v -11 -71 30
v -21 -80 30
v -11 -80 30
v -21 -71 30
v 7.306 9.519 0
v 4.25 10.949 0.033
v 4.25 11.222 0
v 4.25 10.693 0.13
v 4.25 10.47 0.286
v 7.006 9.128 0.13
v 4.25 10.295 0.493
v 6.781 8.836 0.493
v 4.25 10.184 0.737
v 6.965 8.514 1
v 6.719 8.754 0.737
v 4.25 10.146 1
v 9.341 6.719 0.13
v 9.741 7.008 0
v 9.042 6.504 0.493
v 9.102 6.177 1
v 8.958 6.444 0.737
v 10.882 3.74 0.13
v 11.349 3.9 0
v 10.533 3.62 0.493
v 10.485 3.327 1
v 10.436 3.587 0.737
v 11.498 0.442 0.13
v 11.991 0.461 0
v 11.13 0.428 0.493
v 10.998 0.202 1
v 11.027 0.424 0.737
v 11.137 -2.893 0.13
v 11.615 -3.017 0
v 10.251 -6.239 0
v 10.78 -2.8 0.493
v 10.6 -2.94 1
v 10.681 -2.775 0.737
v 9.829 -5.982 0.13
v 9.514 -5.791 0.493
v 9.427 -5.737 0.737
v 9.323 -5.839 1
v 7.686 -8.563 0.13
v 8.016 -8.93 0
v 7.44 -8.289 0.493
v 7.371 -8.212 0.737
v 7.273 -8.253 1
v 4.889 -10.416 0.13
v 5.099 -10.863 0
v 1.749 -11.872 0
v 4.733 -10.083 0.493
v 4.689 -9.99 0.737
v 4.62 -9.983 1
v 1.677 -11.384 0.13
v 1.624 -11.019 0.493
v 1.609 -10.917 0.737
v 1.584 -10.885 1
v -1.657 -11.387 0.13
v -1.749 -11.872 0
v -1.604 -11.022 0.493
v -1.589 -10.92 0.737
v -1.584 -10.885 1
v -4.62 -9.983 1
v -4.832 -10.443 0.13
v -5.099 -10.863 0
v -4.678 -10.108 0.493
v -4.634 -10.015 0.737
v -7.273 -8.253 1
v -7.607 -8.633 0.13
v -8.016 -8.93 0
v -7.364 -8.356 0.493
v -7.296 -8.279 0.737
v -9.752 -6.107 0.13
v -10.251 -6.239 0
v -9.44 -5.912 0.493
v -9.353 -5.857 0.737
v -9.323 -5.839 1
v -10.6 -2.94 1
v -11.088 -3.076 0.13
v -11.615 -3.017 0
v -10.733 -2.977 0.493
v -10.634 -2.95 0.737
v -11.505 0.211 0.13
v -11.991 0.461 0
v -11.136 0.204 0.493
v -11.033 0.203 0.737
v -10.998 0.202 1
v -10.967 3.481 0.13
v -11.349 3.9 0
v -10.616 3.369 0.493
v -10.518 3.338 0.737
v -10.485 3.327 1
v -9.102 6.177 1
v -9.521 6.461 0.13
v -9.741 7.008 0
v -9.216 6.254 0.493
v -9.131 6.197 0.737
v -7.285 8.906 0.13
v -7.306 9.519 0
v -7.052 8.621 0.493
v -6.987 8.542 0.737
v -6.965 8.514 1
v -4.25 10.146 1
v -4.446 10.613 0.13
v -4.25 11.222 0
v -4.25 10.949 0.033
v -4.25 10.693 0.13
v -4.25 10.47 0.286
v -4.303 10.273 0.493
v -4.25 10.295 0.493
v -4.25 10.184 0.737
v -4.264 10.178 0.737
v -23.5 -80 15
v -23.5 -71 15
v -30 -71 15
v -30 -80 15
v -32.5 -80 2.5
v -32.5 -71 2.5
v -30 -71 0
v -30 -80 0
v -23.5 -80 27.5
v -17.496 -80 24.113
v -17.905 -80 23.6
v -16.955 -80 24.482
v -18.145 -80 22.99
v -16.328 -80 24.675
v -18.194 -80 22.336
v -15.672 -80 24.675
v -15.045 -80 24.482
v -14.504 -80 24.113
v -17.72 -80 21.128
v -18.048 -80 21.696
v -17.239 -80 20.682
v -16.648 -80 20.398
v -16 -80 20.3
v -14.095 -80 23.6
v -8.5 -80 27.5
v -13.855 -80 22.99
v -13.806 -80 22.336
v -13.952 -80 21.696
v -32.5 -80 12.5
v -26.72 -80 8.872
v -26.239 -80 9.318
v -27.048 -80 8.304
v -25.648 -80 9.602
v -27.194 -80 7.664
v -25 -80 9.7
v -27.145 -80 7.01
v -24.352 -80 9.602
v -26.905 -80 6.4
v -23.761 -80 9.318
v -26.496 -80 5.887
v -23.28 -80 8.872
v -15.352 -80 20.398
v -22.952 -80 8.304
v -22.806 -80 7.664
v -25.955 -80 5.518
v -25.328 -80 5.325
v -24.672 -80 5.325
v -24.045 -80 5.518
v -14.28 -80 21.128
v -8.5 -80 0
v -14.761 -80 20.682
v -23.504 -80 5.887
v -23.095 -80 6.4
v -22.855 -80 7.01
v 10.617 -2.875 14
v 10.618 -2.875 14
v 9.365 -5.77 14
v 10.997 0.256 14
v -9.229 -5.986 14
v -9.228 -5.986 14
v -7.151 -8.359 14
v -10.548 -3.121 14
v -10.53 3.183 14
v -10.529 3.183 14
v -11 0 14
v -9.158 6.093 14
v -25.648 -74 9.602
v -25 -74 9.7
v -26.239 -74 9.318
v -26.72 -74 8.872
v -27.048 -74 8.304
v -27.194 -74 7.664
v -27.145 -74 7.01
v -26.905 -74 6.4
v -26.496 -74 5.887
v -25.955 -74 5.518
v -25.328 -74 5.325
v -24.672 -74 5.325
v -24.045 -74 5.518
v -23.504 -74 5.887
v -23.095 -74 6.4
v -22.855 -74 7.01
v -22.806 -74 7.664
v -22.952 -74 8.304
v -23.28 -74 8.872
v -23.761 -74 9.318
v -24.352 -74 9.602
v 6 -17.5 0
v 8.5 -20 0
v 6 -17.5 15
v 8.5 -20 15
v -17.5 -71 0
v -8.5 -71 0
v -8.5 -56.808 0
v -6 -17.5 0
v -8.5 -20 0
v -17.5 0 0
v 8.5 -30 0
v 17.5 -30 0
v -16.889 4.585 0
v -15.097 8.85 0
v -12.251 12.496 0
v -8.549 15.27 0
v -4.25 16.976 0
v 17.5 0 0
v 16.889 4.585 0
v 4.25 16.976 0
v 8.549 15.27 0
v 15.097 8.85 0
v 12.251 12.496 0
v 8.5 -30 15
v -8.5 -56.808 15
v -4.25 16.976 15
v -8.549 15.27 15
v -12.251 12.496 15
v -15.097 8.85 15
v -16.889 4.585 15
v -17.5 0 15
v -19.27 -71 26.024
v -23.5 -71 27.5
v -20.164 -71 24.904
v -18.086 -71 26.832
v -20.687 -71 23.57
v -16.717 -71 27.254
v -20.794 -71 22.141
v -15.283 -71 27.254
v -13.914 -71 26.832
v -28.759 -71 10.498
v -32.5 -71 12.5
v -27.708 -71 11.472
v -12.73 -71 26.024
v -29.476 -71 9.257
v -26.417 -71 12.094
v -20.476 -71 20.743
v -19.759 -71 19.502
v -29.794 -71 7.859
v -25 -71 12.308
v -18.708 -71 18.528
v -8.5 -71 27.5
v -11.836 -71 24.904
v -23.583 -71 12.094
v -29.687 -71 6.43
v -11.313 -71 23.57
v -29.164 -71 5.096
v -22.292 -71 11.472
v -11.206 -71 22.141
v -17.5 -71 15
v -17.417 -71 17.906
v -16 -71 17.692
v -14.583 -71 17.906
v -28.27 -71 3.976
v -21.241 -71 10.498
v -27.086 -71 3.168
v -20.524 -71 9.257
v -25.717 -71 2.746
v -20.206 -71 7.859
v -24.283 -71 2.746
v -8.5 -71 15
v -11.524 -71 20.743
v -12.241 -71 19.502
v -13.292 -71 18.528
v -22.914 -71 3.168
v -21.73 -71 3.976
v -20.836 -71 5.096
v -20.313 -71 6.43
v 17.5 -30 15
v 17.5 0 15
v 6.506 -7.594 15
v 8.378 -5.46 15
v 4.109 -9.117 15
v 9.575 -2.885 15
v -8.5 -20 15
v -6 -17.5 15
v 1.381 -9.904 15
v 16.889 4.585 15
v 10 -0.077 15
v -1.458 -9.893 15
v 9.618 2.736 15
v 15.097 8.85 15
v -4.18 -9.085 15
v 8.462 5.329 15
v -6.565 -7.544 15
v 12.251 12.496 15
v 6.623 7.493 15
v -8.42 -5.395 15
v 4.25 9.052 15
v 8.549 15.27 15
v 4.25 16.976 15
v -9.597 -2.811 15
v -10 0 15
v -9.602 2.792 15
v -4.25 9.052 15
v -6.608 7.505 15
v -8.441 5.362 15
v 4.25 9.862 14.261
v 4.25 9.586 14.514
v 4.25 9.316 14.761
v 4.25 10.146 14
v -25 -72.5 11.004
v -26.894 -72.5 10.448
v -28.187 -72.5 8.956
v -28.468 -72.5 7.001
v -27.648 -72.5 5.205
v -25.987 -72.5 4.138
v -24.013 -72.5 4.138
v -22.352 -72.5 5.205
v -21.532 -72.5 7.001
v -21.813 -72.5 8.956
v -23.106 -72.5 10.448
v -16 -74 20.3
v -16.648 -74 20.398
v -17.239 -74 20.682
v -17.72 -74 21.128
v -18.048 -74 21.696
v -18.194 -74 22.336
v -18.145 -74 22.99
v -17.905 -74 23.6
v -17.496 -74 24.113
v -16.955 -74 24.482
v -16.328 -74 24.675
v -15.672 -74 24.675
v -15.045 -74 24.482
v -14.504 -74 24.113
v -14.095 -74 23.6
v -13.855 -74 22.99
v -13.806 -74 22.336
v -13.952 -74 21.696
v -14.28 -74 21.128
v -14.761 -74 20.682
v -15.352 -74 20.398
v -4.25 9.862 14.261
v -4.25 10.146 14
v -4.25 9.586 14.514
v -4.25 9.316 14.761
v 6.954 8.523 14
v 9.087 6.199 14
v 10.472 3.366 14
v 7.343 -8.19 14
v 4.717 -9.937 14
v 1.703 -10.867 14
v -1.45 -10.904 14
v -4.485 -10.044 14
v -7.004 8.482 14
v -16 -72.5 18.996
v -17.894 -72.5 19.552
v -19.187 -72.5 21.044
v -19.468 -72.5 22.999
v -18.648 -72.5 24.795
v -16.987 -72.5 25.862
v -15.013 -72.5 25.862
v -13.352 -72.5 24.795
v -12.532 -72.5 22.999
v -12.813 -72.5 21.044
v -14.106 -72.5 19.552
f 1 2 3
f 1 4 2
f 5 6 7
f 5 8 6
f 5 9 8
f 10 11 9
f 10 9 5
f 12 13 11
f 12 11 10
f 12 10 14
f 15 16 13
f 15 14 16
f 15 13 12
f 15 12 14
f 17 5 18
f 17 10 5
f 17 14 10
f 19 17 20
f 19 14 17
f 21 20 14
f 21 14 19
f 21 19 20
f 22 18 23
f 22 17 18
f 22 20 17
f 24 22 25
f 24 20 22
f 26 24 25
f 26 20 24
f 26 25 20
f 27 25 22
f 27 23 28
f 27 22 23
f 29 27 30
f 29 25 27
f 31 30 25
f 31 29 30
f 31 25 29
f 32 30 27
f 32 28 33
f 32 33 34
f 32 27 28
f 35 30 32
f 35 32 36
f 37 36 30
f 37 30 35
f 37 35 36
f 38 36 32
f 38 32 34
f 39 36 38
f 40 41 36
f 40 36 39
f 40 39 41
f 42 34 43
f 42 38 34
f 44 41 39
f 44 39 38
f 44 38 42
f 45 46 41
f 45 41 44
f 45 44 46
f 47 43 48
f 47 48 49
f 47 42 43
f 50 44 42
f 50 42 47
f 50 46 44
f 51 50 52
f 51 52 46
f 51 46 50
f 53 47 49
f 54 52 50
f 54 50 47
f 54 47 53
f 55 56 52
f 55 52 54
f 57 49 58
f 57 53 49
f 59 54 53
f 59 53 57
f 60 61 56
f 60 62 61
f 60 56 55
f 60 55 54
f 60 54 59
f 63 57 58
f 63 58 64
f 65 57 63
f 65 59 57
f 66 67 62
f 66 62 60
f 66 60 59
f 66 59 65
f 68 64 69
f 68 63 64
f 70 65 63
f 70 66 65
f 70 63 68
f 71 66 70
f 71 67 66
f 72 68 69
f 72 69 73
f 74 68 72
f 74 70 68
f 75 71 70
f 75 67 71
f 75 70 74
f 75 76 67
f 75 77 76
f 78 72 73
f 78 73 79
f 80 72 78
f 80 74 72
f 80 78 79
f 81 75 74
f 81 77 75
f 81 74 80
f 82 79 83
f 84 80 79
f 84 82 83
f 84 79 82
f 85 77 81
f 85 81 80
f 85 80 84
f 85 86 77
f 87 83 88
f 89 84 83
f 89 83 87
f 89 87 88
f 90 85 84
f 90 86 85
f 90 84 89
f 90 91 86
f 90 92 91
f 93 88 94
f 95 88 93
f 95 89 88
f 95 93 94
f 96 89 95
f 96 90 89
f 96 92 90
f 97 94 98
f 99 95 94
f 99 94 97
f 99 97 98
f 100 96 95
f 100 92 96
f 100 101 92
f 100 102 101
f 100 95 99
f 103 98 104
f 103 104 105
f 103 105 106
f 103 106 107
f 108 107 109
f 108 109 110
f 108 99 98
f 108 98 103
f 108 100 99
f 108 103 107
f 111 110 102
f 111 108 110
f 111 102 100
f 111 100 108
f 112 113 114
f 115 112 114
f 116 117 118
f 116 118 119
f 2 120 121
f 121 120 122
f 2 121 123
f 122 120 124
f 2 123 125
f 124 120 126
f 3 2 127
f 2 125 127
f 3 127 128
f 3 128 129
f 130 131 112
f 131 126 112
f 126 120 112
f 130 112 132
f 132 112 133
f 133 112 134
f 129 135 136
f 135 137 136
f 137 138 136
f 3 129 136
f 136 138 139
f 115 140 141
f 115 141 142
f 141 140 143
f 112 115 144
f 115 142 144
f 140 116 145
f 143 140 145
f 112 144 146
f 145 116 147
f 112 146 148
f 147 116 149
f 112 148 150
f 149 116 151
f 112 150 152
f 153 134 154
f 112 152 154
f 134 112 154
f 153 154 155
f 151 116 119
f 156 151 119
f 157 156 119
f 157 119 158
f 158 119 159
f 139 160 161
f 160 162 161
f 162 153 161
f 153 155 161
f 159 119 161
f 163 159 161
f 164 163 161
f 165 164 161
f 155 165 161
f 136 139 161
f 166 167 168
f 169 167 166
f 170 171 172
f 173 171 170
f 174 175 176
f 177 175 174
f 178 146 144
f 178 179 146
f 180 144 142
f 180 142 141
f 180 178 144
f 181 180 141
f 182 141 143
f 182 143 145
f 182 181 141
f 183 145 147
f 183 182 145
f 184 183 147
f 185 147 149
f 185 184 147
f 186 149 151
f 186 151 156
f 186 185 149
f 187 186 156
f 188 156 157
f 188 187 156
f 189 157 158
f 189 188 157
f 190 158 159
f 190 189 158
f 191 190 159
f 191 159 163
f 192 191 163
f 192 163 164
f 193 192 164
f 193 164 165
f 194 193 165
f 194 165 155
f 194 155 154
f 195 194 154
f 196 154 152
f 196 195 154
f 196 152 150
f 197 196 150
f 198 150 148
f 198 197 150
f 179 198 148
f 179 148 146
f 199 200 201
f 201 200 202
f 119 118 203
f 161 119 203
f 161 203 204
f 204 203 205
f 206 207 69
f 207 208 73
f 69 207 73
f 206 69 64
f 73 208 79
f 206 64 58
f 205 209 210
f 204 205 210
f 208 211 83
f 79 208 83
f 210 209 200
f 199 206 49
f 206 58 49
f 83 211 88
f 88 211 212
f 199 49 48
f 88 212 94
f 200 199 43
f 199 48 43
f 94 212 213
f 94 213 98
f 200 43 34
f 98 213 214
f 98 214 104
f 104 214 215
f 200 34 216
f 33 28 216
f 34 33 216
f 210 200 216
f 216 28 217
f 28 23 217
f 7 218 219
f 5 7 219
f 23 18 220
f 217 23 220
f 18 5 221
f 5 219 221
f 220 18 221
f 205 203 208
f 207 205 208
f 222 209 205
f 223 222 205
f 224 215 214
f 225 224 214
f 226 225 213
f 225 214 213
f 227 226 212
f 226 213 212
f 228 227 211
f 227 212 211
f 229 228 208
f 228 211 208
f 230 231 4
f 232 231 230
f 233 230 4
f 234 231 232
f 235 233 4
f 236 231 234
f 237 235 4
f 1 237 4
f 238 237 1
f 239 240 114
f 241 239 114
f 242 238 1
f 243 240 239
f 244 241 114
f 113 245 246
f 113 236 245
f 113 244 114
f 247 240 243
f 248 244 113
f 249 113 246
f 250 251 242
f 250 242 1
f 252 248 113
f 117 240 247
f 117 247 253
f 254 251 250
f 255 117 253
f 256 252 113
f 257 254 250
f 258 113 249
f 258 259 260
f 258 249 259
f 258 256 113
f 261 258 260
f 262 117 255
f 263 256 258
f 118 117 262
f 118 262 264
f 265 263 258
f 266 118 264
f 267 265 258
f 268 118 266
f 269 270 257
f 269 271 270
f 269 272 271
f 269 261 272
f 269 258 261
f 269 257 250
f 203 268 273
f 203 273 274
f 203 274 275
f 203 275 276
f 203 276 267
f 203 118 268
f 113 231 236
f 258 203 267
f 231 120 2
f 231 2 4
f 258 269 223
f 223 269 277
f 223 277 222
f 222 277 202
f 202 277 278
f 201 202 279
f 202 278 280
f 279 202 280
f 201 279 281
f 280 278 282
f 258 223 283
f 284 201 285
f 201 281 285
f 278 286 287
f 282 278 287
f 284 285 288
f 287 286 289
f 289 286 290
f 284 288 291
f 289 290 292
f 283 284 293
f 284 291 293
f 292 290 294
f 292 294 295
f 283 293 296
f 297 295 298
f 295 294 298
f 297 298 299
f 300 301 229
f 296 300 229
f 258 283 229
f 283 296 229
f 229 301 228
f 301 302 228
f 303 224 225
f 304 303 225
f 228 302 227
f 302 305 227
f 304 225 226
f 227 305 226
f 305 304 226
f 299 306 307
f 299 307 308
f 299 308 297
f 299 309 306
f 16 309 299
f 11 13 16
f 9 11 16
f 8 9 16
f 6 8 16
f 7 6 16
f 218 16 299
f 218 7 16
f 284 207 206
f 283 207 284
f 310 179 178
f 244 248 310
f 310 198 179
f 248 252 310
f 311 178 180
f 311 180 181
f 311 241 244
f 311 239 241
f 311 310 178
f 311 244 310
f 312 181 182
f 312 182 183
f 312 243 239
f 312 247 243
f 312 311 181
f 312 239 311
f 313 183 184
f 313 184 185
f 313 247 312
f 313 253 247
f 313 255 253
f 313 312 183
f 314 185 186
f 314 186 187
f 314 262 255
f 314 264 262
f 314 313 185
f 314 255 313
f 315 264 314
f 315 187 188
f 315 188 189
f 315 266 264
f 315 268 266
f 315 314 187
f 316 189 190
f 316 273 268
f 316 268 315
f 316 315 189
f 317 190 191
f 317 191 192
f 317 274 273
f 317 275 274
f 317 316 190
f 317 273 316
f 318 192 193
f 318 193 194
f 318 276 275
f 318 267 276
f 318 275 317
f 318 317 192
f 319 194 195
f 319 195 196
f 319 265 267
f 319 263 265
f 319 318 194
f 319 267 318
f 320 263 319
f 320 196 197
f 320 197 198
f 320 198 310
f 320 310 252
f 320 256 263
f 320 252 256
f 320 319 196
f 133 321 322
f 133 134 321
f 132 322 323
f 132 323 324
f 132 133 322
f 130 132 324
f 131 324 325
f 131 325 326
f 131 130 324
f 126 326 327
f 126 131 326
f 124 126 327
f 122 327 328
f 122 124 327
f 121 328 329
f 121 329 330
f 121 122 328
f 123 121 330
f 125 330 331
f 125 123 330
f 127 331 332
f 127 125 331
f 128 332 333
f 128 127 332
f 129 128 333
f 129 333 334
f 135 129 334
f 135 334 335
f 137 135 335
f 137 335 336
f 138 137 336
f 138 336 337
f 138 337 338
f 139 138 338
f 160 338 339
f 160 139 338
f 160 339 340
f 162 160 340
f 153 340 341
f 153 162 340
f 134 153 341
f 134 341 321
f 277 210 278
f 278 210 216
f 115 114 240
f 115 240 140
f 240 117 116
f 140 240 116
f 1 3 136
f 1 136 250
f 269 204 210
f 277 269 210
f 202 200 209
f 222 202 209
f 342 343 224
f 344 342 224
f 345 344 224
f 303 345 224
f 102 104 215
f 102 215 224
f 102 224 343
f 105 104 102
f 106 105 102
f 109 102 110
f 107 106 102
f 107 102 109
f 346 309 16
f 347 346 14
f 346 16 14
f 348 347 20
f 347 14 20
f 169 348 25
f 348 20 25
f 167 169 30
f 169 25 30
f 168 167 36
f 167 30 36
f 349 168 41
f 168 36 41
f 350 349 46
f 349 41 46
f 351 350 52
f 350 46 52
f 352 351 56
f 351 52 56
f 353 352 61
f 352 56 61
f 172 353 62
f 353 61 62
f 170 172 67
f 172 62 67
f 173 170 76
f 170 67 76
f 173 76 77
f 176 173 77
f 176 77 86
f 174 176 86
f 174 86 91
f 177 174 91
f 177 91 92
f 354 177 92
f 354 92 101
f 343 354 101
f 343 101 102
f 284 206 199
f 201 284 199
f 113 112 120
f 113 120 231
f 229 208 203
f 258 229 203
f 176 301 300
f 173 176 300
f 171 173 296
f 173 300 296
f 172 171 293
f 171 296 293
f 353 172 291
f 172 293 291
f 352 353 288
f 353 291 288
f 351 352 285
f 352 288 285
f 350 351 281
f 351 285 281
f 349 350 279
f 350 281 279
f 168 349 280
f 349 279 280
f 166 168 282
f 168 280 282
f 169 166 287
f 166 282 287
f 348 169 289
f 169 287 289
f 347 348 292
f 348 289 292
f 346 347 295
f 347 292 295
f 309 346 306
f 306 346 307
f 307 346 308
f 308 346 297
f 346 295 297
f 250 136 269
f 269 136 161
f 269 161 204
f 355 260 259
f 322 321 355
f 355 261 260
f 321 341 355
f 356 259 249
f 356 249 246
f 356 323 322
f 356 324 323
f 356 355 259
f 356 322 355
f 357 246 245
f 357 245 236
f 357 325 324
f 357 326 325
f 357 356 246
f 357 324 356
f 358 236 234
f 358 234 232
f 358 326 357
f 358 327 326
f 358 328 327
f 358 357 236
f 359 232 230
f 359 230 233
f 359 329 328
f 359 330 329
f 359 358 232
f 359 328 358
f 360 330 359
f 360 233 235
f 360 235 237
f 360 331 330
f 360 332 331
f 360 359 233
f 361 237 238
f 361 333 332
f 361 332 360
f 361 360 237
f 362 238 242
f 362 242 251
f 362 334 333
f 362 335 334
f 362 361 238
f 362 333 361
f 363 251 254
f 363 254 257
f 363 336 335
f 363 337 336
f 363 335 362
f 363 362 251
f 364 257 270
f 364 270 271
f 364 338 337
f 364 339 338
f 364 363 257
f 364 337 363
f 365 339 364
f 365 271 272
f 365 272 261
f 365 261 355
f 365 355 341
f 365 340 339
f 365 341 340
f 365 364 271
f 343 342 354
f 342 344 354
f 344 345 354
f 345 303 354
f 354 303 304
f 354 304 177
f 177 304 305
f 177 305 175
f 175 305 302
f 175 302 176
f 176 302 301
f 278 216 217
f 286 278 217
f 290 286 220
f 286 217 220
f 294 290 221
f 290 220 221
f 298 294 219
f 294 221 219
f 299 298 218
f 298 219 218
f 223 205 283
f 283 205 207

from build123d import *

# Parameters (mm, degrees)
BOSS_EXTRUDE1_DEPTH = 15
BOSS_EXTRUDE3_START = 1
BOSS_EXTRUDE3_DEPTH = 1
SKETCH7_W           = 15
SKETCH7_H           = 9
BOSS_EXTRUDE4_DEPTH = 15
FILLET1_R           = 1
CHAMFER1_SIZE       = 2.5
CHAMFER2_SIZE       = 1


with BuildPart() as part:
    # Sketch1 → Boss-Extrude1 (new body)
    with BuildSketch(Plane.XY):
        with BuildLine():
            Line((-8.5, -71), (17.5, -30))
            Line((17.5, -30), (17.5, 0))
            ThreePointArc((17.5, 0), (13.795379661, 10.767427734), (4.25, 16.976086121))
            Line((4.25, 16.976086121), (4.25, 10.145811944))
            ThreePointArc((4.25, 10.145811944), (0, -11), (-4.25, 10.145811944))
            Line((-4.25, 10.145811944), (-4.25, 16.976086121))
            ThreePointArc((-4.25, 16.976086121), (-13.795379661, 10.767427734), (-17.5, 0))
            Line((-17.5, 0), (-17.5, -71))
            Line((-17.5, -71), (-32.5, -71))
            Line((-32.5, -71), (-32.5, -80))
            Line((-32.5, -80), (-8.5, -80))
            Line((-8.5, -80), (-8.5, -71))
        make_face()
        Polygon((8.5, -17.5), (8.5, -30), (-8.5, -56.807692308), (-8.5, -17.5), align=None, mode=Mode.SUBTRACT)
    extrude(amount=BOSS_EXTRUDE1_DEPTH)

    # Sketch6 → Boss-Extrude3 (add)
    with BuildSketch(Plane(origin=(0, 0, 15), x_dir=(-1, 0, 0), z_dir=(0, 0, -1)).offset(BOSS_EXTRUDE3_START)):
        with BuildLine():
            Line((-4.25, 9.051933495), (-4.25, 10.145811944))
            ThreePointArc((-4.25, 10.145811944), (-6.093028803, -9.158329542), (11, 0))
            ThreePointArc((11, 0), (9.158329542, 6.093028803), (4.25, 10.145811944))
            Line((4.25, 10.145811944), (4.25, 9.051933495))
            ThreePointArc((4.25, 9.051933495), (8.440971508, 5.361902647), (10, 0))
            ThreePointArc((10, 0), (-5.361902647, -8.440971508), (-4.25, 9.051933495))
        make_face()
    extrude(amount=-BOSS_EXTRUDE3_DEPTH)

    # Sketch7 → Boss-Extrude4 (add)
    with BuildSketch(Plane.XY.offset(15)):
        with Locations((-16, -75.5)):
            Rectangle(SKETCH7_W, SKETCH7_H)
    extrude(amount=BOSS_EXTRUDE4_DEPTH)

    # Sketch11 → Cut-Revolve4 (revolve, cut)
    with BuildSketch(Plane.ZY.offset(25)):
        Polygon((7.5, -71), (7.5, -80), (9.7, -80), (9.7, -74), (12.307860213, -71), align=None)
    revolve(axis=Axis((-25, -71, 7.5), (0, -1, 0)), mode=Mode.SUBTRACT)

    # Sketch10 → Cut-Revolve3 (revolve, cut)
    with BuildSketch(Plane.XY.offset(22.5), mode=Mode.PRIVATE) as cut_revolve3_sk:
        Polygon((-16, -71), (-11.192139787, -71), (-13.8, -74), (-13.8, -80), (-16, -80), align=None)
    revolve(cut_revolve3_sk.sketch.rotate(Axis((-16, -80, 22.5), (0, 1, 0)), 90), axis=Axis((-16, -80, 22.5), (0, 1, 0)), mode=Mode.SUBTRACT)

    # Fillet1
    fillet1_edges = [part.edges().sort_by_distance(p)[0] for p in [
        (0, -11, 0),
    ]]
    fillet(fillet1_edges, radius=FILLET1_R)

    # Chamfer1
    chamfer1_edges = [part.edges().sort_by_distance(p)[0] for p in [
        (-32.5, -75.5, 0),
        (-8.5, -17.5, 7.5),
        (8.5, -17.5, 7.5),
        (-32.5, -75.5, 15),
        (-23.5, -75.5, 30),
        (-8.5, -75.5, 30),
    ]]
    chamfer(chamfer1_edges, length=CHAMFER1_SIZE)

    # Chamfer2
    chamfer2_edges = [part.edges().sort_by_distance(p)[0] for p in [
        (0, -10, 14),
    ]]
    chamfer(chamfer2_edges, length=CHAMFER2_SIZE - 0.0001)  # a hair under: the kernel refuses the full size


solid = part.part
